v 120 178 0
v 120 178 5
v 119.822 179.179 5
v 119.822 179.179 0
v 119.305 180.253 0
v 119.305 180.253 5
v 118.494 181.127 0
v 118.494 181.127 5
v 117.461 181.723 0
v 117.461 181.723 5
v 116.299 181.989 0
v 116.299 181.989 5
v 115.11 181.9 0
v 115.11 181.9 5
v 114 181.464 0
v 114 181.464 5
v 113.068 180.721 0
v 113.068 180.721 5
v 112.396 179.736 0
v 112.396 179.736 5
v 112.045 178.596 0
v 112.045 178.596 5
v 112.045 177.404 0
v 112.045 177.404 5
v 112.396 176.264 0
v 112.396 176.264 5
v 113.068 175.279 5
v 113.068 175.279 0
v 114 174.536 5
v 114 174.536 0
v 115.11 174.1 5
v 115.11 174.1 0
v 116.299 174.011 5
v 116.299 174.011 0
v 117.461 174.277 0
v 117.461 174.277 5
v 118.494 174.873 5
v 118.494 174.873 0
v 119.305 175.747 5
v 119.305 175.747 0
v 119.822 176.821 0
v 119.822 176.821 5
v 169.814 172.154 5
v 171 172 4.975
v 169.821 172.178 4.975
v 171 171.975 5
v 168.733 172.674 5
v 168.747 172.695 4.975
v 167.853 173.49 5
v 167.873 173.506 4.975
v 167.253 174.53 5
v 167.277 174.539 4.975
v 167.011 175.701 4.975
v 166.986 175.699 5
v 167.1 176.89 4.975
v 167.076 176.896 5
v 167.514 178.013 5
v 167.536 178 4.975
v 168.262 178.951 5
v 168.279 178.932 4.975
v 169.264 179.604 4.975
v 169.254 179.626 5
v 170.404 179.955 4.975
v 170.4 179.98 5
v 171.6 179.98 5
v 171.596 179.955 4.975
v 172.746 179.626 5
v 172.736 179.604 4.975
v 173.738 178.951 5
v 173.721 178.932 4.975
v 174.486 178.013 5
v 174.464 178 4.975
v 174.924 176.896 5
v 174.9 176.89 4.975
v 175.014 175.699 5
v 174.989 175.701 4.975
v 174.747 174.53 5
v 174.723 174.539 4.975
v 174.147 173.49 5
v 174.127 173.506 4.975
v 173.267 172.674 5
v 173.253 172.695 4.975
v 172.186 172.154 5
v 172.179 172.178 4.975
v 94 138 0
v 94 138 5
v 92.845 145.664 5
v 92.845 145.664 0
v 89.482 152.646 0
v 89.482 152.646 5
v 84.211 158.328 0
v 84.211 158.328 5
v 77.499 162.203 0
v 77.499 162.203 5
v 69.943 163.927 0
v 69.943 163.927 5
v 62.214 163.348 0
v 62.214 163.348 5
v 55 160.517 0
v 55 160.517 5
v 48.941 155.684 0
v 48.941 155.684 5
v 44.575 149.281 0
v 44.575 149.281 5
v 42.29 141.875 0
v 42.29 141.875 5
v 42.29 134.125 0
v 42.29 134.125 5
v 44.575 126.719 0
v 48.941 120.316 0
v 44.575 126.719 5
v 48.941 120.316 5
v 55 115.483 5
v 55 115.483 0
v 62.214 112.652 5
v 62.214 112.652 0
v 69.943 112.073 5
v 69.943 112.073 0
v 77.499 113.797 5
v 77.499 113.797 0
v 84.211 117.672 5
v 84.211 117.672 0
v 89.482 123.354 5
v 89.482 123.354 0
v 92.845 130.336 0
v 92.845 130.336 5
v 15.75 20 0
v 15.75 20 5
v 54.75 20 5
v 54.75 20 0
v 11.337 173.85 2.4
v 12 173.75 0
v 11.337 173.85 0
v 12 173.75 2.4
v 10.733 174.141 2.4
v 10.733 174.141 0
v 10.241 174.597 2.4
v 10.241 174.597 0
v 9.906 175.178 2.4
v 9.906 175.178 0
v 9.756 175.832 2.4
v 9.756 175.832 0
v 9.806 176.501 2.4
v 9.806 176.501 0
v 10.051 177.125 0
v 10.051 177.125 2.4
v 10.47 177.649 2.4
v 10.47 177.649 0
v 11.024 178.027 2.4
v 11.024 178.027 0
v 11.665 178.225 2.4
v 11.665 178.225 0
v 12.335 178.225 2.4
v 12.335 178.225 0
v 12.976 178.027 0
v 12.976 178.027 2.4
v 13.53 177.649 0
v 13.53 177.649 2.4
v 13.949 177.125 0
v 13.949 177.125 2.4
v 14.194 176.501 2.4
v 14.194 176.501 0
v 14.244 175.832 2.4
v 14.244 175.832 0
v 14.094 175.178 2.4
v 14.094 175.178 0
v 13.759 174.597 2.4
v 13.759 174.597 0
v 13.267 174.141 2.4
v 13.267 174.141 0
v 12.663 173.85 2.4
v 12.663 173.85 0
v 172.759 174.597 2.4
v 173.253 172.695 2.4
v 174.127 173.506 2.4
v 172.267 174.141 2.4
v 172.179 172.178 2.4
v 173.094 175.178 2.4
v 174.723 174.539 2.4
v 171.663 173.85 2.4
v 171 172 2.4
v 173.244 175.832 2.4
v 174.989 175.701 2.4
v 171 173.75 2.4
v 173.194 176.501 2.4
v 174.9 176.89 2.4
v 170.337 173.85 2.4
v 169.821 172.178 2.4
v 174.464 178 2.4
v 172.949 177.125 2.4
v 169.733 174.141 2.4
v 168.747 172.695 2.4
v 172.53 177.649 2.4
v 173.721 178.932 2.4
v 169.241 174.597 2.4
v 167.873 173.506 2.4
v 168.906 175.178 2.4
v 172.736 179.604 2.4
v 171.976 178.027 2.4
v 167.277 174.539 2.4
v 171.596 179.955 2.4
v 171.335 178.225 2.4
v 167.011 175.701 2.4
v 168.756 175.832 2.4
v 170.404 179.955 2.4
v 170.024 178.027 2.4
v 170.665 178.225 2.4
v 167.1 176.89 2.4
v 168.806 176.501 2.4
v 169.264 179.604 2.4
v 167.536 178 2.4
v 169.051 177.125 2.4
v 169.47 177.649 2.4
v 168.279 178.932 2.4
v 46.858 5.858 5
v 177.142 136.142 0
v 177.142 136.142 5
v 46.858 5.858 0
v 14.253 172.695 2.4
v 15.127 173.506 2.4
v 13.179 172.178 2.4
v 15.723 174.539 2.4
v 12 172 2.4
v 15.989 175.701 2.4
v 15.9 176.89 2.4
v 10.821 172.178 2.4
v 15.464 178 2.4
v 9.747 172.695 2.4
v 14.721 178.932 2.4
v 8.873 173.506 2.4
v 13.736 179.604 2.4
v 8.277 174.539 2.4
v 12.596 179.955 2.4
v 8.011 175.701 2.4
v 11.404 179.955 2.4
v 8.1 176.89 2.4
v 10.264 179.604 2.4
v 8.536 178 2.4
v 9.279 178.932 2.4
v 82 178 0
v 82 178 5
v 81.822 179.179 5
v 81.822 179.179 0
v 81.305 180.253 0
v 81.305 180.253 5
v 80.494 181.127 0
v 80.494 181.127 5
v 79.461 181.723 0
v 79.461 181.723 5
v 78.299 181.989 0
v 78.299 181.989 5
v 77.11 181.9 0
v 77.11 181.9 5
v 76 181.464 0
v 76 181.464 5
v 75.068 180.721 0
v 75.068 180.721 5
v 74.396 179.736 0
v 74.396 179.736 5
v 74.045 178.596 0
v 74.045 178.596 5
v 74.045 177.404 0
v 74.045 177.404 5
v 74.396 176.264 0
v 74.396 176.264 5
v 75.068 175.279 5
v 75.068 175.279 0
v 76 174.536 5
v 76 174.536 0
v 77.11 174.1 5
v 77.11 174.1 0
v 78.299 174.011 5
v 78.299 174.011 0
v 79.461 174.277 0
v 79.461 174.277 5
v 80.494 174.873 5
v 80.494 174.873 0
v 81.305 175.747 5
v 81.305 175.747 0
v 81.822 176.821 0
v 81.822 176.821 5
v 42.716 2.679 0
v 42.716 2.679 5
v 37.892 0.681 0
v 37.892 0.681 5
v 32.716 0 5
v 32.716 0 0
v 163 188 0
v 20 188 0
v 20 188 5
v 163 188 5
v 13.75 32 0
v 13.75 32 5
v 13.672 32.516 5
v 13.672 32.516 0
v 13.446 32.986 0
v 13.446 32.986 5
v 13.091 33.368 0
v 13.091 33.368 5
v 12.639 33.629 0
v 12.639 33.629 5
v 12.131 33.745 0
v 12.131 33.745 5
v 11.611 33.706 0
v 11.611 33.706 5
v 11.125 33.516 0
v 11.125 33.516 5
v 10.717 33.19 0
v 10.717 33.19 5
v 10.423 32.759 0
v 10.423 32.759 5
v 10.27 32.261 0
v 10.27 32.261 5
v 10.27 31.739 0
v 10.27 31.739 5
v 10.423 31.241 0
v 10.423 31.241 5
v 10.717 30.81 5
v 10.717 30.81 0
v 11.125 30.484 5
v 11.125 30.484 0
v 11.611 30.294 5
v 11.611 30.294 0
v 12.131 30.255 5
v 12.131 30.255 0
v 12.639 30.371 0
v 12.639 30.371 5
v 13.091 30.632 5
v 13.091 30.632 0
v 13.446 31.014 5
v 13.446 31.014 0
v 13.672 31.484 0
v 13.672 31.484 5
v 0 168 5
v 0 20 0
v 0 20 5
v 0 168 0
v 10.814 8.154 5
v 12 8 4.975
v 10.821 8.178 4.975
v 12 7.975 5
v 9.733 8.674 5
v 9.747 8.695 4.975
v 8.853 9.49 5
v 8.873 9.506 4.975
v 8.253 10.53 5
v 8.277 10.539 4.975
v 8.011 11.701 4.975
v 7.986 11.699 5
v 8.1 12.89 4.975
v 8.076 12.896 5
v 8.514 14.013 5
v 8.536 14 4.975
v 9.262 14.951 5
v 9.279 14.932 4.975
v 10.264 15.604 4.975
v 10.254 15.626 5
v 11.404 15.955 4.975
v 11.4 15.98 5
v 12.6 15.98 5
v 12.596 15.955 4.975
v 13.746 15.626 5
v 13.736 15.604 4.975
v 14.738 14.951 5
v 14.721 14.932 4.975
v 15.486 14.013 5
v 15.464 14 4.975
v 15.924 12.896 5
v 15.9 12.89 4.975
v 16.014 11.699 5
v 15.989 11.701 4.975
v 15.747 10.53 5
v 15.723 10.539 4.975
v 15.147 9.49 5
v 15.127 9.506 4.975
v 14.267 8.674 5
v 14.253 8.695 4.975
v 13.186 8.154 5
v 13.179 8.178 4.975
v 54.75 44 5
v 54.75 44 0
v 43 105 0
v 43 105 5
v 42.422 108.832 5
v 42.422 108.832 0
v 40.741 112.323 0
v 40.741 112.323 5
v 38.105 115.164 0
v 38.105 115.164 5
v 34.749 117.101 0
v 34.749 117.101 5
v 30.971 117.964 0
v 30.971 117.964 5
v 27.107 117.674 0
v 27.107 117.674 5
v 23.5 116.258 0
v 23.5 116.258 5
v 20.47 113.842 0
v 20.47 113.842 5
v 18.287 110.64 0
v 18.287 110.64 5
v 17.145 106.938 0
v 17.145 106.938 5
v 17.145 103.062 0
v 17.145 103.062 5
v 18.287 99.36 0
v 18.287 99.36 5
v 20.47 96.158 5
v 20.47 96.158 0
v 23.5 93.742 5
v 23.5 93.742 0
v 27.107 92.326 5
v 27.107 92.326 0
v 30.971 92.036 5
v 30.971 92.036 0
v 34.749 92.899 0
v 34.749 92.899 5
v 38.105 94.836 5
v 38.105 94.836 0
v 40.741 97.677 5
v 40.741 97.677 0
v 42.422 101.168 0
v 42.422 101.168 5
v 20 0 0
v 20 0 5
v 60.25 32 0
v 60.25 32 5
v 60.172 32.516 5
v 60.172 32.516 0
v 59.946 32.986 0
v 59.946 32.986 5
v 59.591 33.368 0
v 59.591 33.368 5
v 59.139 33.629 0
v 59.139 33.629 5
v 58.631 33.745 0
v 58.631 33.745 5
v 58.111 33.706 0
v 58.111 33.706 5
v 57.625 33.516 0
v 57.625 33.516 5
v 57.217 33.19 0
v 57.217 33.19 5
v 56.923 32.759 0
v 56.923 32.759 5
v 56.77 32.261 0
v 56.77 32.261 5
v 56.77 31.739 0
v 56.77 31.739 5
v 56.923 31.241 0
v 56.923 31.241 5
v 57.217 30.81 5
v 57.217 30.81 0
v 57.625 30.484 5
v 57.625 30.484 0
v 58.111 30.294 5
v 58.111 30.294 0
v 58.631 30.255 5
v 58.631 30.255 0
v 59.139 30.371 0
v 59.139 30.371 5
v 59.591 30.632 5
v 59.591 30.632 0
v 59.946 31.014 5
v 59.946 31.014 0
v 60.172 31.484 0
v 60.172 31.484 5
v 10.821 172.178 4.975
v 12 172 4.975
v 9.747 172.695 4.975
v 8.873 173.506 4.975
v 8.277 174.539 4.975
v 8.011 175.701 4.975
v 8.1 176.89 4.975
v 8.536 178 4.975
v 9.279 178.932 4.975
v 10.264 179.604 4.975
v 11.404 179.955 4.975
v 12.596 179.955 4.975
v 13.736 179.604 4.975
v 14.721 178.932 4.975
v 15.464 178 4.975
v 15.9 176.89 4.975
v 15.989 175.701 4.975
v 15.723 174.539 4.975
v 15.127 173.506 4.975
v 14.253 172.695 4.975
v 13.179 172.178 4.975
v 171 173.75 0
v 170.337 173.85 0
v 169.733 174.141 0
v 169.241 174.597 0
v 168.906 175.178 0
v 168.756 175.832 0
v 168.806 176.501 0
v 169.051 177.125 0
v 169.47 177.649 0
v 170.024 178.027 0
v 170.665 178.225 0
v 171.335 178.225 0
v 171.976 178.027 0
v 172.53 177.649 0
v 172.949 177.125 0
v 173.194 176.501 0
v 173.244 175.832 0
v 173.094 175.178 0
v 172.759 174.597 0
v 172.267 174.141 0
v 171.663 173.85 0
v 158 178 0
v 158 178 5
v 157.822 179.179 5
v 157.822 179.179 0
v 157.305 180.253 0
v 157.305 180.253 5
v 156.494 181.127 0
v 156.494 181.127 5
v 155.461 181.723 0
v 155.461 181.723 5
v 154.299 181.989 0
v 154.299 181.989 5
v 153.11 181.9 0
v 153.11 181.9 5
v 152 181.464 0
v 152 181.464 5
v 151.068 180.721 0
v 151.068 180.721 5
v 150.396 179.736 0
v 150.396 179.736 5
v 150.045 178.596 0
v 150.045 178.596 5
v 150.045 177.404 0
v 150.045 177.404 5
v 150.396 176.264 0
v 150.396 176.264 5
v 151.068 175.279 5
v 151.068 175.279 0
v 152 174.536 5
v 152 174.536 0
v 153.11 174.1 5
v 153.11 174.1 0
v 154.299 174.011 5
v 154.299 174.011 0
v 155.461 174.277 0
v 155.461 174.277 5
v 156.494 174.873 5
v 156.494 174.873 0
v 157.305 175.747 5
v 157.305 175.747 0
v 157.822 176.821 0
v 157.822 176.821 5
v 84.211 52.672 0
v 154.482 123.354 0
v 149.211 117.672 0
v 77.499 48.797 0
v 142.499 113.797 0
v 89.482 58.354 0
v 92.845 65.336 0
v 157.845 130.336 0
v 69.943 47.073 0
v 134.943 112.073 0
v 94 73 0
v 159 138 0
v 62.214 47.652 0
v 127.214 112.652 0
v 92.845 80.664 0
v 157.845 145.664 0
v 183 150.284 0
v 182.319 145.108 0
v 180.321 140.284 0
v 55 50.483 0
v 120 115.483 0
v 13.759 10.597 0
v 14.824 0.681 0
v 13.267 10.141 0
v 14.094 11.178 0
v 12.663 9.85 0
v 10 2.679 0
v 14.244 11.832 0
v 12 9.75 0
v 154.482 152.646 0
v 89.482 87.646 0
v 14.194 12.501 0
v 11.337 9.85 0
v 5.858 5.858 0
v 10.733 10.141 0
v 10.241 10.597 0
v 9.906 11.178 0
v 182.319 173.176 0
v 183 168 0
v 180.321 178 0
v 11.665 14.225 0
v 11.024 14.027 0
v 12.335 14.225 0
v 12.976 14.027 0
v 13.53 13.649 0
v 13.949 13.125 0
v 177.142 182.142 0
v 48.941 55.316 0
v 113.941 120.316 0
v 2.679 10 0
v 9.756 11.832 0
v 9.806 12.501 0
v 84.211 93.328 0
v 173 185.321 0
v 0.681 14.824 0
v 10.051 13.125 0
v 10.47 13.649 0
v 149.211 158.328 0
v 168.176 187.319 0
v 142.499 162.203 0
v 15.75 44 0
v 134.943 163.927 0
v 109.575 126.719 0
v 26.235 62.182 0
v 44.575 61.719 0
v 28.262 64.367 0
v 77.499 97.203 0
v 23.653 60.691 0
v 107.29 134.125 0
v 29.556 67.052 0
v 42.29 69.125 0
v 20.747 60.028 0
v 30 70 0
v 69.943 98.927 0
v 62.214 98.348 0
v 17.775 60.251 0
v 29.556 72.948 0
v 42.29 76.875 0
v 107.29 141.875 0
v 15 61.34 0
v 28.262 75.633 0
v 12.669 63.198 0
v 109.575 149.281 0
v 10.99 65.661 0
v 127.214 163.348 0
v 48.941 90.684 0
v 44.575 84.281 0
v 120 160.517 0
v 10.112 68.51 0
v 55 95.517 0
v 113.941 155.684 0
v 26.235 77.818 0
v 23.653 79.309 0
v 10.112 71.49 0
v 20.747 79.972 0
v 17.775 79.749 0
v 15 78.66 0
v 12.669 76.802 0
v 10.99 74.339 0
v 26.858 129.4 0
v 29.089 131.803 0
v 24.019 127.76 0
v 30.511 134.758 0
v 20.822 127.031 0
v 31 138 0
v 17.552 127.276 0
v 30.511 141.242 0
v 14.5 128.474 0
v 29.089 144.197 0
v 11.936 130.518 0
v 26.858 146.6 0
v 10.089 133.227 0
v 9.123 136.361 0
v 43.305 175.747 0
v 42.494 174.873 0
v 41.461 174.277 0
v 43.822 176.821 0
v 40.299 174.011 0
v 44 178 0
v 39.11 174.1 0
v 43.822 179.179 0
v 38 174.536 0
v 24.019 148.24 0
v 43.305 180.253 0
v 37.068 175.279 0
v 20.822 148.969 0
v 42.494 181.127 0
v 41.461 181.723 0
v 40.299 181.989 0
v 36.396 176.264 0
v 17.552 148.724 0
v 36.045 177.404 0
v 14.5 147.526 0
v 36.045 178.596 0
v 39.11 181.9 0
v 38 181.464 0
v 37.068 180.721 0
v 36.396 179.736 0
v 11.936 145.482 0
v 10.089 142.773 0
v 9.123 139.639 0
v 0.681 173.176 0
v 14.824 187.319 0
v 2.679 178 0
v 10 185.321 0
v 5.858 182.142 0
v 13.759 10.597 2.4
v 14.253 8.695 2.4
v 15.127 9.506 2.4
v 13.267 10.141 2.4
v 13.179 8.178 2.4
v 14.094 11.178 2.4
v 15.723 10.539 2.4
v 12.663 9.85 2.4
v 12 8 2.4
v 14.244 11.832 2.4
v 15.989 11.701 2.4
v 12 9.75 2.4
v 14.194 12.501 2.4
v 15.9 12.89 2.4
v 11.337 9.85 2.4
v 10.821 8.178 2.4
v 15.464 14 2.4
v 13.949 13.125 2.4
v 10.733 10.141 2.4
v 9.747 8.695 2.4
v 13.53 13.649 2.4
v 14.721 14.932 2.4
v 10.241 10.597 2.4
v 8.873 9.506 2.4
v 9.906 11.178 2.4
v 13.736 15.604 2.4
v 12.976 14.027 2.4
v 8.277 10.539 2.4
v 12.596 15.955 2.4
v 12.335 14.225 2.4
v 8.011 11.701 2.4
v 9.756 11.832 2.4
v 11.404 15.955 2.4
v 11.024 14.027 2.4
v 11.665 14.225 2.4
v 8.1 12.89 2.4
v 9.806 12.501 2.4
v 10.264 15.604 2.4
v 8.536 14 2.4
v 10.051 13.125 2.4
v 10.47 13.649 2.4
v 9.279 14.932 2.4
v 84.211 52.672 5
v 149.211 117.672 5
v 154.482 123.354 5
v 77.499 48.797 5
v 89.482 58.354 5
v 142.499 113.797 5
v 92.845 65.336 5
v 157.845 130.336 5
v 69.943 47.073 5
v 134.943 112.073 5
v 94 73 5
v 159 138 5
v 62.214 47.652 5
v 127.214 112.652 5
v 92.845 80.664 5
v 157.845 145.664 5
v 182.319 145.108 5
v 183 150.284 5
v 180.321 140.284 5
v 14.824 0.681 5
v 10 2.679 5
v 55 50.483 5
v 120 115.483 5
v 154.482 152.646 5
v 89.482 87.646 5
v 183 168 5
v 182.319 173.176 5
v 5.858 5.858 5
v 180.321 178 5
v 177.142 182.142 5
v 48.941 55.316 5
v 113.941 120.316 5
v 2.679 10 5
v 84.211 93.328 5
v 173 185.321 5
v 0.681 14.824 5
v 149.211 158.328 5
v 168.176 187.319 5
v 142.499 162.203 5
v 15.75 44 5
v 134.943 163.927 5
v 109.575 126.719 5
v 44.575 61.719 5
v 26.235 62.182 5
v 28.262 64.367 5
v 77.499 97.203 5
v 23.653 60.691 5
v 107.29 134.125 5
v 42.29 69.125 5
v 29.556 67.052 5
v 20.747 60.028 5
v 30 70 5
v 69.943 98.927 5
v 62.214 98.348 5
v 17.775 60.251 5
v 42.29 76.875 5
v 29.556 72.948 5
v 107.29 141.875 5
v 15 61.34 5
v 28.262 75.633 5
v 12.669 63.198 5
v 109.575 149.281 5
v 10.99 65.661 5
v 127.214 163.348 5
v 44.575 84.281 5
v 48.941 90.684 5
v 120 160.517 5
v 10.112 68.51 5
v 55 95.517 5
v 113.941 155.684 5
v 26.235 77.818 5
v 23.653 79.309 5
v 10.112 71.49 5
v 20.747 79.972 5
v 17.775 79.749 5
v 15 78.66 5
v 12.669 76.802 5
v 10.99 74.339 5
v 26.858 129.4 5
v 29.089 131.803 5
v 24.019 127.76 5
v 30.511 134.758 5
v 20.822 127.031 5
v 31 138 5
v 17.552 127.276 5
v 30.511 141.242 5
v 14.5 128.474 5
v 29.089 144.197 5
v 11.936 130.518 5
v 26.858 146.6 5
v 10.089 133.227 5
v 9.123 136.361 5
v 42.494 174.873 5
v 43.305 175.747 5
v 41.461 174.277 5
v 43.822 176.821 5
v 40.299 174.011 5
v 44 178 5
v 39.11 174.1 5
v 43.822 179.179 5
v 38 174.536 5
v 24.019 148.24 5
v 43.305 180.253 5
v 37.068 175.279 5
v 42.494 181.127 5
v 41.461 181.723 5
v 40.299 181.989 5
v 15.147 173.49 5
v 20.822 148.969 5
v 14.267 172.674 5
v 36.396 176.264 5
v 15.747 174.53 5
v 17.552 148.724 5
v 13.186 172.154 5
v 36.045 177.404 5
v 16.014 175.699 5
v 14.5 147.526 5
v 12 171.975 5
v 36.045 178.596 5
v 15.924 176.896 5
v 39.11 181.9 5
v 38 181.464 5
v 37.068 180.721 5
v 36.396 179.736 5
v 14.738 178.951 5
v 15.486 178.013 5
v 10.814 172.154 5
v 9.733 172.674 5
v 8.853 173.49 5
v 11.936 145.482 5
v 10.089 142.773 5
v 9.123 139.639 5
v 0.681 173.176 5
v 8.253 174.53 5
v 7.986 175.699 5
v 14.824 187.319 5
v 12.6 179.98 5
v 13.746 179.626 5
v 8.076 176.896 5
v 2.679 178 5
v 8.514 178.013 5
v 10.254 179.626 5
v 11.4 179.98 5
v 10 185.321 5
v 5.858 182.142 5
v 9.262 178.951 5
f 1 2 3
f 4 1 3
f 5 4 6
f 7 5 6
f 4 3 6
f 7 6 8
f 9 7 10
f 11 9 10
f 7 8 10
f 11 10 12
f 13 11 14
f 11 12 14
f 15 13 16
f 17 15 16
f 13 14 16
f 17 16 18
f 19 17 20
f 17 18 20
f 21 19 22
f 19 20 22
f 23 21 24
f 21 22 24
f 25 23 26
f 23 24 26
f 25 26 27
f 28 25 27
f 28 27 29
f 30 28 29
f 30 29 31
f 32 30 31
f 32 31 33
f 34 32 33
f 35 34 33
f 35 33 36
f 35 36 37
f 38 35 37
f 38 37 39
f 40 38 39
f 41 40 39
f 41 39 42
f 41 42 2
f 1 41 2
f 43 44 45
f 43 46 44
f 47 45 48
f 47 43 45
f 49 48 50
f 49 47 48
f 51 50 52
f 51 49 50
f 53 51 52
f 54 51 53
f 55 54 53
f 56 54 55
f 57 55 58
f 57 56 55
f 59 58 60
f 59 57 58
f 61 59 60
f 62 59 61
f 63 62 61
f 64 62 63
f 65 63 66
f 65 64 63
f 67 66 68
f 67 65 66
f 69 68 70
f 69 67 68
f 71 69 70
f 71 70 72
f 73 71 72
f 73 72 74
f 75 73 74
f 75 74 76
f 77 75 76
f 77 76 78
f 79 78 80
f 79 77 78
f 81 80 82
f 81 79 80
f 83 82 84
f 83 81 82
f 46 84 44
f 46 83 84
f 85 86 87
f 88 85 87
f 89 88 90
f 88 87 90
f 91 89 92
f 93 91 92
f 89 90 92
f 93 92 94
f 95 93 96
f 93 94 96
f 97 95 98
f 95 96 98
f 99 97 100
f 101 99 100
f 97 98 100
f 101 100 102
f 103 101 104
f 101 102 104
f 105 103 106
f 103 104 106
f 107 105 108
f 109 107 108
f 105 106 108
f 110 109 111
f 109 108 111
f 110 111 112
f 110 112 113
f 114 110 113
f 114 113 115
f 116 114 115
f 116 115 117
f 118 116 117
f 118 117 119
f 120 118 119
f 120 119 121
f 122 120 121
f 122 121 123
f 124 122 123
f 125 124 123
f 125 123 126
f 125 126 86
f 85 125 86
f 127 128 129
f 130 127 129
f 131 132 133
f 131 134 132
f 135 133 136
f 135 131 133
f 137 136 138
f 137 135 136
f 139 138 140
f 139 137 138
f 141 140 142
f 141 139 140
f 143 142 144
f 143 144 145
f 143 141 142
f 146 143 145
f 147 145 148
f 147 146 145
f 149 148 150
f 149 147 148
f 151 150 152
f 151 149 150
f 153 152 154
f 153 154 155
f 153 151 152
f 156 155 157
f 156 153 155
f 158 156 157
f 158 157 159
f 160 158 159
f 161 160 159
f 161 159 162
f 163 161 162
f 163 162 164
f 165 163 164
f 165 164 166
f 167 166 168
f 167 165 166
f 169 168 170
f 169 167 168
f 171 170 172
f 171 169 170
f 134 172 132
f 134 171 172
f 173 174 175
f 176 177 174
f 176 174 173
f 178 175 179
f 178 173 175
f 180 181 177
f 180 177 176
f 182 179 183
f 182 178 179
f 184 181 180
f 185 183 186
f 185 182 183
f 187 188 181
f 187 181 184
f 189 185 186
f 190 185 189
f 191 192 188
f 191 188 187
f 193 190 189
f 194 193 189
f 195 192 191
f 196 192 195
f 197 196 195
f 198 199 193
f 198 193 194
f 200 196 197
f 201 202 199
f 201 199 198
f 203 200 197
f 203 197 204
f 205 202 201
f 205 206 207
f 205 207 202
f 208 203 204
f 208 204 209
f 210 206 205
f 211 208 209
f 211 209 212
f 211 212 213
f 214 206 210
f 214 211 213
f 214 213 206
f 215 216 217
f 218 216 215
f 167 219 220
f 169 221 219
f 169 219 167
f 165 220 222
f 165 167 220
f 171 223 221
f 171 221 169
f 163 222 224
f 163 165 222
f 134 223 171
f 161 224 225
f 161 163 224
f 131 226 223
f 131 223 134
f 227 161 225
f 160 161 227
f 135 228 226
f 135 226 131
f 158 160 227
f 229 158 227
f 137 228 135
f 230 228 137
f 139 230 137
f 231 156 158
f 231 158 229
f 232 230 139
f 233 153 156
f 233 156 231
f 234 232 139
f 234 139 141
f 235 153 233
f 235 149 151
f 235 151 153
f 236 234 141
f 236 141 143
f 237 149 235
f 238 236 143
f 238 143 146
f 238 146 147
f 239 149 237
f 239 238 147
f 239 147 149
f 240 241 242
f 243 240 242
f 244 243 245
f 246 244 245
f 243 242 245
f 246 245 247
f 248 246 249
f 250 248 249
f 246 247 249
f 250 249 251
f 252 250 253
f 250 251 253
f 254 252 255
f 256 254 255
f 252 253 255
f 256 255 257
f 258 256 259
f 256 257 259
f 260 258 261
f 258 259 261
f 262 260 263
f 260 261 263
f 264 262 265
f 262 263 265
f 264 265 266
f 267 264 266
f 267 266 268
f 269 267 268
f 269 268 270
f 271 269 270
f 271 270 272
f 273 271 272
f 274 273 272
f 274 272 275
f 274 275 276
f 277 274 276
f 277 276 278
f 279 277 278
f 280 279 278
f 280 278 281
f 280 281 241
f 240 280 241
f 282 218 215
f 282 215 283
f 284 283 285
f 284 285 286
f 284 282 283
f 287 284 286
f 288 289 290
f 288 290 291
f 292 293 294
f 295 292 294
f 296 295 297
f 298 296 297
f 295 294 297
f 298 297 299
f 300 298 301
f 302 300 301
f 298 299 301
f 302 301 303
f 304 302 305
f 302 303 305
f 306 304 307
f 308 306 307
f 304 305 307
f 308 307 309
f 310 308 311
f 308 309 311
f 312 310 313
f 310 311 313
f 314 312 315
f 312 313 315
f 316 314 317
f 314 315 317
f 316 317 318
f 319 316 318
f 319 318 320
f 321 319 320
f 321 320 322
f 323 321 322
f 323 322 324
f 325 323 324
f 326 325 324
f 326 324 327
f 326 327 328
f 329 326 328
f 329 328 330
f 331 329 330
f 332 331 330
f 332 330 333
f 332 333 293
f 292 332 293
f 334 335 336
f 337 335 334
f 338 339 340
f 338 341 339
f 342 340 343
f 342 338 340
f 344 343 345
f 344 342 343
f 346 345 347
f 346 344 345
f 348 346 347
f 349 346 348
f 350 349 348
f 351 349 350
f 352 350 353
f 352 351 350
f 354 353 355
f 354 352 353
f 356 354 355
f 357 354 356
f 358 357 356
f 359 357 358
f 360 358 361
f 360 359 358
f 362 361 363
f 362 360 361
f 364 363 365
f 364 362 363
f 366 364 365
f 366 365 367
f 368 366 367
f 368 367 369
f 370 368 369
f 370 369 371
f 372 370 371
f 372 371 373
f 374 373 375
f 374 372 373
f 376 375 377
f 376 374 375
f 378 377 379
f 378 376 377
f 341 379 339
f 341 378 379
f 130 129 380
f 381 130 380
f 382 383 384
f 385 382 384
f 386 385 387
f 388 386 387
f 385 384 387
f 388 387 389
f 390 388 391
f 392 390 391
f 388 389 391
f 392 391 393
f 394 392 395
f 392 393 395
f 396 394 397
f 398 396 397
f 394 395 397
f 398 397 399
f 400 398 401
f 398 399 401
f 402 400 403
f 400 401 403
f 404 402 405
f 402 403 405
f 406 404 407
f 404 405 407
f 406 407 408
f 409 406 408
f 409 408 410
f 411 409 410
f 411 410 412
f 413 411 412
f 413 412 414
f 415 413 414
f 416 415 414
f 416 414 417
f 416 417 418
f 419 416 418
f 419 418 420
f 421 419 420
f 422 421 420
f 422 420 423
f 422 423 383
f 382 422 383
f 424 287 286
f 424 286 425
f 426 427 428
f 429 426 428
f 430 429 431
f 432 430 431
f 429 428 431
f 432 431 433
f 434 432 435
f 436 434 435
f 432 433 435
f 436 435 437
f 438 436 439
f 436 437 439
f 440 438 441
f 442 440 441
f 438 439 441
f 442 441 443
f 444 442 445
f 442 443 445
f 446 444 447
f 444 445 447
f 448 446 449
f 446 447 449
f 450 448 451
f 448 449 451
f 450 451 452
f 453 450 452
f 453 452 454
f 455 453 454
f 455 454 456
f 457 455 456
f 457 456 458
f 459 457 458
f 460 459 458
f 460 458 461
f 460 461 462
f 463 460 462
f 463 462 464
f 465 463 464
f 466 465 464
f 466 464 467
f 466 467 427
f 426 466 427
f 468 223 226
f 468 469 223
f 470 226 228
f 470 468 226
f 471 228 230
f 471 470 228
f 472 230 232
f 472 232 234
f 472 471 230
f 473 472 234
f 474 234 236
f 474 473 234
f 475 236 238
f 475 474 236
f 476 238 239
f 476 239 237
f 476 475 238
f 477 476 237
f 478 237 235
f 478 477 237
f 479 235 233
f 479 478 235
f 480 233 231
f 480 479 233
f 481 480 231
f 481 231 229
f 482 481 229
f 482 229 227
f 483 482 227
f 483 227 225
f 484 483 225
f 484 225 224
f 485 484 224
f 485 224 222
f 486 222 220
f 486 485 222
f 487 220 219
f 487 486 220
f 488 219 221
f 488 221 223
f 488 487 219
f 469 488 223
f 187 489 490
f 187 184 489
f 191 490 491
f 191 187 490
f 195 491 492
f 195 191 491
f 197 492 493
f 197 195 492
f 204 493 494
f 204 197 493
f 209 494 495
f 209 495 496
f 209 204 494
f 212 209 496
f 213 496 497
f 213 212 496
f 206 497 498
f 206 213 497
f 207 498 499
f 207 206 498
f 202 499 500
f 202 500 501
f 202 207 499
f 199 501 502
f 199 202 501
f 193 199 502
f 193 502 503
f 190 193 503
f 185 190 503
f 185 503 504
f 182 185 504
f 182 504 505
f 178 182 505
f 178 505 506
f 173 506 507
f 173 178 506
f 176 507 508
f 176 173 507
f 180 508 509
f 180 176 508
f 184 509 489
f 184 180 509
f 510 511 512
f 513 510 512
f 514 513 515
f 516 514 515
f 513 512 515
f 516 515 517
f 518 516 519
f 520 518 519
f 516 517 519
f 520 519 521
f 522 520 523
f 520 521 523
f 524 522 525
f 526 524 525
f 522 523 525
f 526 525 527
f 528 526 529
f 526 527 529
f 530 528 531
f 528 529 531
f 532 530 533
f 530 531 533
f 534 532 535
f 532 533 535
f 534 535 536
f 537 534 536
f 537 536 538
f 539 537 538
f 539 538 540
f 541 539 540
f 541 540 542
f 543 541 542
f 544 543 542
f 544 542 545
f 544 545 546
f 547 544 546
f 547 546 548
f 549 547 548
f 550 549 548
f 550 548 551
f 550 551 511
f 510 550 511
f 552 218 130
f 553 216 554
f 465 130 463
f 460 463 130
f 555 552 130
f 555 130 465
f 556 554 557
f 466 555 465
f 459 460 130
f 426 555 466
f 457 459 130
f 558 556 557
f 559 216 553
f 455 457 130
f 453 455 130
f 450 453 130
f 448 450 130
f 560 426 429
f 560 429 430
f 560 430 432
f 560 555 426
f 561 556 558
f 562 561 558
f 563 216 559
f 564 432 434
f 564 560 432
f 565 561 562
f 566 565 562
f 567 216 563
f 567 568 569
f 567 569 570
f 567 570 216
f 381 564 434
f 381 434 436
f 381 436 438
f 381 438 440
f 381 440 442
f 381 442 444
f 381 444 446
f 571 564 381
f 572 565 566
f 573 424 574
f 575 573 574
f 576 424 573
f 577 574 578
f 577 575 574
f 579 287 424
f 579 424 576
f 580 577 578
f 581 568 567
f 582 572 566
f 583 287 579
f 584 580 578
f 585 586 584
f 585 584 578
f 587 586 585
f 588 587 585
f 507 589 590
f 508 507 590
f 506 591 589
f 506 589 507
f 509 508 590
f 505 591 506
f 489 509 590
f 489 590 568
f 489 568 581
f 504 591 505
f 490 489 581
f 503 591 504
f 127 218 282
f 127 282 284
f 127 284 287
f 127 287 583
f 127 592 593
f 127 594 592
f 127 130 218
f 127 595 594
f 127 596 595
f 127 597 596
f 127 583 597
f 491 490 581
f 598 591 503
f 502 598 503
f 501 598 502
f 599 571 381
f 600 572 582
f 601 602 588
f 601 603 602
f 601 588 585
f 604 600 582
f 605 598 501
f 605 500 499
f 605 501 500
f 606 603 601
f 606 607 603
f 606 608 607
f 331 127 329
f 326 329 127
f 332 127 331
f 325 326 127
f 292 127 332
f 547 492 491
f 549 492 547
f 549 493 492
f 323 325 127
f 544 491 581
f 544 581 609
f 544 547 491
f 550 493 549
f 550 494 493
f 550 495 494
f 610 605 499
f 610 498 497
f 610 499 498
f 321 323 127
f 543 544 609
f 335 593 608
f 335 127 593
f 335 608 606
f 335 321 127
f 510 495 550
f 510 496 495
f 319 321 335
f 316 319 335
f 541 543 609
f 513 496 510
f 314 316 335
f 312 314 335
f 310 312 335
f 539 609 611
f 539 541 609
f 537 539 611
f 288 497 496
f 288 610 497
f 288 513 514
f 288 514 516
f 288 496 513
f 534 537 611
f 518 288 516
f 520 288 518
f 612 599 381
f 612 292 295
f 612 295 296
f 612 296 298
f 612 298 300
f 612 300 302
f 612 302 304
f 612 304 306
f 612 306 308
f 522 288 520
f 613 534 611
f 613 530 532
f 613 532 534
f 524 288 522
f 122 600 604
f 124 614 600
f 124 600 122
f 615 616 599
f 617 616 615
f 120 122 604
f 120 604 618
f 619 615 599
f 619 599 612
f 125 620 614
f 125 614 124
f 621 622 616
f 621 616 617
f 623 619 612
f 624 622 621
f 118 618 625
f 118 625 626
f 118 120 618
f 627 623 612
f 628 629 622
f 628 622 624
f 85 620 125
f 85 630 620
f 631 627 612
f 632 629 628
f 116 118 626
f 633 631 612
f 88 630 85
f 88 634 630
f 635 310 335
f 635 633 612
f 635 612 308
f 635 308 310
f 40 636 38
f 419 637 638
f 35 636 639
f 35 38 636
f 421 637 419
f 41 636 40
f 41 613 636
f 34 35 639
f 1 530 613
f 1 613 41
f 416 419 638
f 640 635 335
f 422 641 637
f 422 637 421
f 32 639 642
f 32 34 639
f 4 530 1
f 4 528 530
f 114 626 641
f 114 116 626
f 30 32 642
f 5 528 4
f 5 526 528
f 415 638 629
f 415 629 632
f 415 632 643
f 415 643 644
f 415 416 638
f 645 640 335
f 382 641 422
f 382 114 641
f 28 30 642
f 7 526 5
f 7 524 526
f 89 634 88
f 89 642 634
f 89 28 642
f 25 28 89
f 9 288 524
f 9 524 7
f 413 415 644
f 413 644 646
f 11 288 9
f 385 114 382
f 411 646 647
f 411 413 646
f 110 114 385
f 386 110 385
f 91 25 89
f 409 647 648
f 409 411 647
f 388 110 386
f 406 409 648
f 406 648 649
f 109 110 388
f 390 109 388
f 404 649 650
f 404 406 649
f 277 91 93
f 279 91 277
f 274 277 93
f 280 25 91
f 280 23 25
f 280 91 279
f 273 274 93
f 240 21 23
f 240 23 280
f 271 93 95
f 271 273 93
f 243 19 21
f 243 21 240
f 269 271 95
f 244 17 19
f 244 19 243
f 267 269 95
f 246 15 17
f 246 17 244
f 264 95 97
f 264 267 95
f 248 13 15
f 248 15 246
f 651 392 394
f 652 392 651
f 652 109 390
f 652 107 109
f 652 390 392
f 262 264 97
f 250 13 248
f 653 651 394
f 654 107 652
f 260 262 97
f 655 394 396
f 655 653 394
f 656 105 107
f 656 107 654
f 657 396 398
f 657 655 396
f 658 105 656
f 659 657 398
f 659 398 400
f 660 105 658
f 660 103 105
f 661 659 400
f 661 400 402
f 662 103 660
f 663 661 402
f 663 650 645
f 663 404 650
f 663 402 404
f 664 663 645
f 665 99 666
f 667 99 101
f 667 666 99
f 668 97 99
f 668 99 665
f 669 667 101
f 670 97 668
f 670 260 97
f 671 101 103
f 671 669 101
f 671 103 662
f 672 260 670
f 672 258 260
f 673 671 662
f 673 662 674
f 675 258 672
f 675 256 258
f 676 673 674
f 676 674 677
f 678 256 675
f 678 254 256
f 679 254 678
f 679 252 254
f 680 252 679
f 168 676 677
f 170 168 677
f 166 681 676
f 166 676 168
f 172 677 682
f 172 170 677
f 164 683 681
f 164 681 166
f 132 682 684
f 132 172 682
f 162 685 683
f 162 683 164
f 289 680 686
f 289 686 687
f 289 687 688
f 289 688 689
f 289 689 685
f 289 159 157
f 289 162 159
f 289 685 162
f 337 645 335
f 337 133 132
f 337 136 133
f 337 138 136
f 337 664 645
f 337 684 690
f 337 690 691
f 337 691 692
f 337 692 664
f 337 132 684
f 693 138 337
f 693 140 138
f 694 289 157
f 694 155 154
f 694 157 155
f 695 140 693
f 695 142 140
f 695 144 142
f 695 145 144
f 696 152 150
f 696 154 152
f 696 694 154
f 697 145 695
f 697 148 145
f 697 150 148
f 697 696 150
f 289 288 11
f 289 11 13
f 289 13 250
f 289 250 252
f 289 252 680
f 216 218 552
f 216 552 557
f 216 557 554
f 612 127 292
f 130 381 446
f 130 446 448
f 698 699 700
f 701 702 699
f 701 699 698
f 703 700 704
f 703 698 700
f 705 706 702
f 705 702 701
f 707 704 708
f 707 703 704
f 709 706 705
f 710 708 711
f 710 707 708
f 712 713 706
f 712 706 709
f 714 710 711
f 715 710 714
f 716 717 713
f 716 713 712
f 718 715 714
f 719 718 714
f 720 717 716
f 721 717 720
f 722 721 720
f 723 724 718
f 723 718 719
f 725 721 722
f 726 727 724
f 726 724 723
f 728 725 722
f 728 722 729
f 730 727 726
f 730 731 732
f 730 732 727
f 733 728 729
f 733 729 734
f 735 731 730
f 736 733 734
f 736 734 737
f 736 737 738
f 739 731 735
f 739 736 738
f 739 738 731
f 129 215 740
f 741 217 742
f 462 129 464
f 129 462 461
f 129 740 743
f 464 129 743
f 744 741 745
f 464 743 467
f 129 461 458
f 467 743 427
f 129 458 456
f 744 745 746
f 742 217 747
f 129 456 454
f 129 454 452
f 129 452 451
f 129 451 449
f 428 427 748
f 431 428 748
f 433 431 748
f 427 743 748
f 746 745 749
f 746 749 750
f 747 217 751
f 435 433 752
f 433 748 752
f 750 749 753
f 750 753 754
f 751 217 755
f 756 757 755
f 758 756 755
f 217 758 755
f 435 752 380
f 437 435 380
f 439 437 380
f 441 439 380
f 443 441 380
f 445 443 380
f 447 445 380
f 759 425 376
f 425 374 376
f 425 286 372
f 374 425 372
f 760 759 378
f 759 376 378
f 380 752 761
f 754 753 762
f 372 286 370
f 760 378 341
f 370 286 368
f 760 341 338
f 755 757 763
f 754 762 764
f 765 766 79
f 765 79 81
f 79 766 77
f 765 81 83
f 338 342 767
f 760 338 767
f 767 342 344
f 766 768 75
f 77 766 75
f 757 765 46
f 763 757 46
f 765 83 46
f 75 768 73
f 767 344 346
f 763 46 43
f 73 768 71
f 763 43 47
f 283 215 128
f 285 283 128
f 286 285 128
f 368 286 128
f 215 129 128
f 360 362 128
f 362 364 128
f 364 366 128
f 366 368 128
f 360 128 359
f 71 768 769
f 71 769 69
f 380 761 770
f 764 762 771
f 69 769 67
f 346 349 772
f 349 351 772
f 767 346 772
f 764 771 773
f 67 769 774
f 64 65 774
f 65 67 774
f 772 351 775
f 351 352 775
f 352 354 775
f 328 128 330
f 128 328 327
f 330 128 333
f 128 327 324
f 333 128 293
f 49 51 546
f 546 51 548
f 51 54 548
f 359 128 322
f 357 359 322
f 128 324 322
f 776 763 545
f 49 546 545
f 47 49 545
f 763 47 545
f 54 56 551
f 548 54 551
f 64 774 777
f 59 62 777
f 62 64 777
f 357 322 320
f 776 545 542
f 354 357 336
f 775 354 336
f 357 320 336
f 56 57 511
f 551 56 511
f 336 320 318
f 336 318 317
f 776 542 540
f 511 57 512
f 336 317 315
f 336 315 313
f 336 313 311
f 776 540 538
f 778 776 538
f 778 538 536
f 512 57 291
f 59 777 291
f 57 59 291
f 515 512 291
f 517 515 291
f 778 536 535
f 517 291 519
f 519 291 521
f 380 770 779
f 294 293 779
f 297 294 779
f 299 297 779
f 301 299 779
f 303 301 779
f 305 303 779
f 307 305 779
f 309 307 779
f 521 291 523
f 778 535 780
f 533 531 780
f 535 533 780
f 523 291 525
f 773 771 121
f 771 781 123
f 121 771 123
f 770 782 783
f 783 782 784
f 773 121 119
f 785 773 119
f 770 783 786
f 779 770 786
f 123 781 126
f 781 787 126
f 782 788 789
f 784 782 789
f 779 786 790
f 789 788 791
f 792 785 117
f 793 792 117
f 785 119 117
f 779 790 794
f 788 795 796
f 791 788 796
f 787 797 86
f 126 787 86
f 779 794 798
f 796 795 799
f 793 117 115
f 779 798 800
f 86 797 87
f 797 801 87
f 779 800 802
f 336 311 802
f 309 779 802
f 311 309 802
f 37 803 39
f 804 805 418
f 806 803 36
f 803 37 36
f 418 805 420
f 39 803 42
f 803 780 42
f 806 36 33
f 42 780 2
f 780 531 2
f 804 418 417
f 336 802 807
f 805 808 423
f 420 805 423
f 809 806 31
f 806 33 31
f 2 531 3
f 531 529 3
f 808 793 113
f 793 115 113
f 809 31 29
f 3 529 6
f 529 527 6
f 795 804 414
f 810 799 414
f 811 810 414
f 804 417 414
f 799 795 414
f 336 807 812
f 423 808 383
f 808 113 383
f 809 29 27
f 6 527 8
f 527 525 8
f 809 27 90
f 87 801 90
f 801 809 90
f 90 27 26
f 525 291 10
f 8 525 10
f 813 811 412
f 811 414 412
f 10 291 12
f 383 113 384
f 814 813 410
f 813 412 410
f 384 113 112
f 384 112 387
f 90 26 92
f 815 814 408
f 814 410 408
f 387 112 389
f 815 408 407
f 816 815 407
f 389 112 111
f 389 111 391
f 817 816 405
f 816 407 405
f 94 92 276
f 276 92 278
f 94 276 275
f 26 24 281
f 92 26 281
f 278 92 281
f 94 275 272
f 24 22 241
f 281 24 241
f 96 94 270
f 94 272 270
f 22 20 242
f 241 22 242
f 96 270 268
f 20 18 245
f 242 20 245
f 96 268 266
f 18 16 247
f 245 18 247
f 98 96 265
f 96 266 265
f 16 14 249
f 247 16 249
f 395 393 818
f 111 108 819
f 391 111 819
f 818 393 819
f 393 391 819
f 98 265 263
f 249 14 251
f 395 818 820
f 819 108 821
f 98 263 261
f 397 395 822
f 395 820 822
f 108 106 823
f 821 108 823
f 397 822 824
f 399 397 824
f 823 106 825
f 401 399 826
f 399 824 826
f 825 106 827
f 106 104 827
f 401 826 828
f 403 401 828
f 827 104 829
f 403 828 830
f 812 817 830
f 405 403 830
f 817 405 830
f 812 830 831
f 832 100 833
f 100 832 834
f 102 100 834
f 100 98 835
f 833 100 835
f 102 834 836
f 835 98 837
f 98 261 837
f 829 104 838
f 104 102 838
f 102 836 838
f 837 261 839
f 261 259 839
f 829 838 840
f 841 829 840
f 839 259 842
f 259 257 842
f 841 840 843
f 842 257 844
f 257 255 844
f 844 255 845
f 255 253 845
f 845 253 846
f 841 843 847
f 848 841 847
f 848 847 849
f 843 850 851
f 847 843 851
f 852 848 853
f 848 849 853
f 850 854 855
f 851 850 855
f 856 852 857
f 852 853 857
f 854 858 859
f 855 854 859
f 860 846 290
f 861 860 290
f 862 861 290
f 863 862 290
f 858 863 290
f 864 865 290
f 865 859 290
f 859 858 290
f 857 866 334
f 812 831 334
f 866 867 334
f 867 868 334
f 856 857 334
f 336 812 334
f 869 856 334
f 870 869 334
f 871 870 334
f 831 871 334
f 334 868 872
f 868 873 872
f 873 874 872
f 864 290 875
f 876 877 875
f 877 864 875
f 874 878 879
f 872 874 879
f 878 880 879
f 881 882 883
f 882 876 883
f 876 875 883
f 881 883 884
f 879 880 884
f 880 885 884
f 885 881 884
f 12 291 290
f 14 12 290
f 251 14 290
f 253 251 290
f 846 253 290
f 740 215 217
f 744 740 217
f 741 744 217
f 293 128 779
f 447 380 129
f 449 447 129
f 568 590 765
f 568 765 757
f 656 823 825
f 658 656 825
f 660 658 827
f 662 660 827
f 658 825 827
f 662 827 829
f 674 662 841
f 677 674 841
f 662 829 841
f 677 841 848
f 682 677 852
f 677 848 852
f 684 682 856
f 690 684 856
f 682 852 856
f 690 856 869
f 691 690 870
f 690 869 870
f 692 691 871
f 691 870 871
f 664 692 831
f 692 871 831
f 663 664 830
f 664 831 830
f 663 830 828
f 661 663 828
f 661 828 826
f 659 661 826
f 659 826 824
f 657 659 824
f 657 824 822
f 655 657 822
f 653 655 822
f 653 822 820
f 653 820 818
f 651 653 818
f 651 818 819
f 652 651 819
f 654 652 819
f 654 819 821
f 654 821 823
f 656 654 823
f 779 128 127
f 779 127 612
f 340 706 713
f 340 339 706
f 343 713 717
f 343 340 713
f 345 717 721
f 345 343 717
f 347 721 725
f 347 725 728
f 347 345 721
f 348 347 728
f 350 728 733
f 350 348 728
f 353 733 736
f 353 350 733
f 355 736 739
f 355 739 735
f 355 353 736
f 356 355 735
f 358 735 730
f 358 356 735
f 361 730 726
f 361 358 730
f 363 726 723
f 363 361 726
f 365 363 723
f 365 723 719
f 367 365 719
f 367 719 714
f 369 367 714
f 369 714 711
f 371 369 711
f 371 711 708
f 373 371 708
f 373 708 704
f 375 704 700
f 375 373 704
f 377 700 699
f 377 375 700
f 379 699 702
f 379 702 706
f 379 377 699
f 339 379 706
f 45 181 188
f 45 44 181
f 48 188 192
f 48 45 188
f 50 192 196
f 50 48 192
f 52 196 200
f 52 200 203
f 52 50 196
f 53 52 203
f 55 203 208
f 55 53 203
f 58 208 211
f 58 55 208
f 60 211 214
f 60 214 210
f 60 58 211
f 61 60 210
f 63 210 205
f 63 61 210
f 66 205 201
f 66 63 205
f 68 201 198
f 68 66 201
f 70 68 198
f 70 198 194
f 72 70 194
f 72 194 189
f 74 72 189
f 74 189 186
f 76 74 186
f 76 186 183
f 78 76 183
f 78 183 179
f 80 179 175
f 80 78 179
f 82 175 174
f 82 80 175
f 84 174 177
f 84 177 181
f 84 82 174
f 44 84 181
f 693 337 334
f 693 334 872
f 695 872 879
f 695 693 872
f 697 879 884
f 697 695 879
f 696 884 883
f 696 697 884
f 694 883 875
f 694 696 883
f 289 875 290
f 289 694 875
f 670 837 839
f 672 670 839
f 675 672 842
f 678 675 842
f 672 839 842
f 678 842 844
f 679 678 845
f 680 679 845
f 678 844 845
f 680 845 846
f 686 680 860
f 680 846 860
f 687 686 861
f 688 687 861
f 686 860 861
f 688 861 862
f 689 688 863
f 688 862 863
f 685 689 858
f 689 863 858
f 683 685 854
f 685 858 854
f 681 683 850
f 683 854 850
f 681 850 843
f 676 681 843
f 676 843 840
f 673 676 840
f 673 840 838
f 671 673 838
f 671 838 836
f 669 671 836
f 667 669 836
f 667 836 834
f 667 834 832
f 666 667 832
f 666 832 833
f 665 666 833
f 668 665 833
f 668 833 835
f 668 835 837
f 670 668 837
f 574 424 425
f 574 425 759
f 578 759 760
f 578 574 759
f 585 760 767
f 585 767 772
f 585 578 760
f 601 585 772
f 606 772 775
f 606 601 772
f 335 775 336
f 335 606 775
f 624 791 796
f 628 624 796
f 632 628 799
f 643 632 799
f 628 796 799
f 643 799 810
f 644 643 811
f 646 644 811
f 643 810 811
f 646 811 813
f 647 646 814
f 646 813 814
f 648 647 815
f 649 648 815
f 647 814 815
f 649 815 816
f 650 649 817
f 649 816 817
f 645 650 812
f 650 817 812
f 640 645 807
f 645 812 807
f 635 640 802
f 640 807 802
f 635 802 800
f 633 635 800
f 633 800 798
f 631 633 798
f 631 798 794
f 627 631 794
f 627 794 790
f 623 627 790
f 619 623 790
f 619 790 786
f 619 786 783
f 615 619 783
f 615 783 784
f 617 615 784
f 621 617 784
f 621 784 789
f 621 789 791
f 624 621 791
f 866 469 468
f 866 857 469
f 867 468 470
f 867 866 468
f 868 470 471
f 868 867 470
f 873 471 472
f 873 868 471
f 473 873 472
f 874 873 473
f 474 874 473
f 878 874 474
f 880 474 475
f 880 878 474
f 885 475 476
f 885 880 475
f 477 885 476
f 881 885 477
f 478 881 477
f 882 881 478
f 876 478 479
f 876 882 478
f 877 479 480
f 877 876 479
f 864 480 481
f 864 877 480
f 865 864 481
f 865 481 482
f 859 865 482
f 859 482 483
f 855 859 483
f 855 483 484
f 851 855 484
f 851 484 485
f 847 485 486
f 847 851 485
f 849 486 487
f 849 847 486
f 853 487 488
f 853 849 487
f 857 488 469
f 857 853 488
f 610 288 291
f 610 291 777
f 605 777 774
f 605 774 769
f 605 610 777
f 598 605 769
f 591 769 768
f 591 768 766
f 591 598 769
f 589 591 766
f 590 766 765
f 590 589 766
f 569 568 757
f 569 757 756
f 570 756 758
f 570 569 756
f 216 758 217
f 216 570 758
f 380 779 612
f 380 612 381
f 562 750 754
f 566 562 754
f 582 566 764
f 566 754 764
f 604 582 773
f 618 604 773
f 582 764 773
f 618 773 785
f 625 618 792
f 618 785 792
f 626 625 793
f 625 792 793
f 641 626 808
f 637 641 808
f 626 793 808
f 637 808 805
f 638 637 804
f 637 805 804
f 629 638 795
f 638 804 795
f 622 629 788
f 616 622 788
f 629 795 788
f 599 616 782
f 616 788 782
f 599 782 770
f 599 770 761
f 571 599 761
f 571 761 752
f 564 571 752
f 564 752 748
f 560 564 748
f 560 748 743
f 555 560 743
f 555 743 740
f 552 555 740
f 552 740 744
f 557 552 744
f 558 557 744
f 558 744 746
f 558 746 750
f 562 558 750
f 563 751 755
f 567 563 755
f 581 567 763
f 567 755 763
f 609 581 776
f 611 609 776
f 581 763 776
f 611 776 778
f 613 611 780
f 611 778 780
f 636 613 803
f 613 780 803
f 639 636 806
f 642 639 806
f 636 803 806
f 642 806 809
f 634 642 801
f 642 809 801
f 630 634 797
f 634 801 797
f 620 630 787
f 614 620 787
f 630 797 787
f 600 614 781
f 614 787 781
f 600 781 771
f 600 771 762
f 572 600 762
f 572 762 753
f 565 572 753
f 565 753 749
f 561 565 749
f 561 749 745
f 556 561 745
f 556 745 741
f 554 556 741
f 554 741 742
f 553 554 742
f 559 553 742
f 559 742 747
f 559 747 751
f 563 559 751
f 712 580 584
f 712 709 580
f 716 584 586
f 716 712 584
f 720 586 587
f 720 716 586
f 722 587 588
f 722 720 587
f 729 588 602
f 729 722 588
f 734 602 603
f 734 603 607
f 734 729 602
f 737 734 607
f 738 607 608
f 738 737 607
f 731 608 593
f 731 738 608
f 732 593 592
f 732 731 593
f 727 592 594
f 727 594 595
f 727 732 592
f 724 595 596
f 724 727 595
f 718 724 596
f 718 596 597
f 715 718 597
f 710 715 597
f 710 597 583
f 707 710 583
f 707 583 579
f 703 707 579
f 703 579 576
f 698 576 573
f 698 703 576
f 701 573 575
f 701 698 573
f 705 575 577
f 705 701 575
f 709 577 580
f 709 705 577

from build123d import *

# Parameters (mm, degrees)
ESTRUSIONE_ESTRUSIONE1_DEPTH                 = 5
FORO_LAMATO_PER_VITE_M4_A_TESTA_CILI_2_COUNT = 2
FORO_LAMATO_PER_VITE_M4_A_TESTA_CILI_2_PITCH = 164
FORO_LAMATO_PER_VITE_M4_A_TESTA_CILI_3_COUNT = 2
FORO_LAMATO_PER_VITE_M4_A_TESTA_CILI_3_PITCH = 159
SCHIZZO5_R                                   = 1.75
SCHIZZO5_R_2                                 = 10
SCHIZZO5_R_3                                 = 11
SCHIZZO5_R_4                                 = 13
SCHIZZO5_R_5                                 = 4
SCHIZZO5_R_6                                 = 26
SCHIZZO5_W                                   = 39
SCHIZZO5_H                                   = 24
TAGLIO_ESTRUSIONE2_DEPTH                     = 7


with BuildPart() as part:
    # Schizzo1 → Estrusione-Estrusione1 (new body)
    with BuildSketch(Plane.XY):
        with BuildLine():
            Line((0, 20), (0, 168))
            ThreePointArc((0, 168), (5.857864376, 182.142135624), (20, 188))
            Line((20, 188), (163, 188))
            ThreePointArc((163, 188), (177.142135624, 182.142135624), (183, 168))
            Line((183, 168), (183, 150.284271247))
            ThreePointArc((183, 150.284271247), (181.47759065, 142.6306026), (177.142135624, 136.142135624))
            Line((177.142135624, 136.142135624), (46.857864376, 5.857864376))
            ThreePointArc((46.857864376, 5.857864376), (40.3693974, 1.52240935), (32.715728753, 0))
            Line((32.715728753, 0), (20, 0))
            ThreePointArc((20, 0), (5.857864376, 5.857864376), (0, 20))
        make_face()
    extrude(amount=ESTRUSIONE_ESTRUSIONE1_DEPTH)

    # Schizzo4 → Foro lamato per Vite M4 a testa cilindrica piana-1 (revolve, cut)
    with BuildSketch(Plane(origin=(12, 176, 5), x_dir=(0, -1, 0), z_dir=(1, 0, 0))):
        Polygon((0, 0), (0, 5), (2.25, 5), (2.25, 2.6), (4, 2.6), (4, 0.025), (4.025, 0), align=None)
    foro_lamato_per_vite_m4_a_testa_cilindri = revolve(axis=Axis((12, 176, 11.35), (0, 0, -1)), mode=Mode.SUBTRACT)

    # Foro lamato per Vite M4 a testa cili 2: Foro lamato per Vite M4 a testa cilindrica piana-1 ×2
    with Locations(*[(0, -i * FORO_LAMATO_PER_VITE_M4_A_TESTA_CILI_2_PITCH, 0) for i in range(1, FORO_LAMATO_PER_VITE_M4_A_TESTA_CILI_2_COUNT)]):
        add(foro_lamato_per_vite_m4_a_testa_cilindri, mode=Mode.SUBTRACT)

    # Foro lamato per Vite M4 a testa cili 3: Foro lamato per Vite M4 a testa cilindrica piana-1 ×2
    with Locations(*[(i * FORO_LAMATO_PER_VITE_M4_A_TESTA_CILI_3_PITCH, 0, 0) for i in range(1, FORO_LAMATO_PER_VITE_M4_A_TESTA_CILI_3_COUNT)]):
        add(foro_lamato_per_vite_m4_a_testa_cilindri, mode=Mode.SUBTRACT)

    # Schizzo5 → Taglio-Estrusione2 (cut)
    with BuildSketch(Plane.XY.offset(5)):
        with Locations((12, 32)):
            Circle(SCHIZZO5_R)
        with Locations((58.5, 32)):
            Circle(SCHIZZO5_R)
        with Locations((20, 70)):
            Circle(SCHIZZO5_R_2)
        with Locations((20, 138)):
            Circle(SCHIZZO5_R_3)
        with Locations((30, 105)):
            Circle(SCHIZZO5_R_4)
        with Locations((40, 178)):
            Circle(SCHIZZO5_R_5)
        with Locations((78, 178)):
            Circle(SCHIZZO5_R_5)
        with Locations((116, 178)):
            Circle(SCHIZZO5_R_5)
        with Locations((154, 178)):
            Circle(SCHIZZO5_R_5)
        with Locations((68, 138)):
            Circle(SCHIZZO5_R_6)
        with Locations((133, 138)):
            Circle(SCHIZZO5_R_6)
        with Locations((68, 73)):
            Circle(SCHIZZO5_R_6)
        with Locations((35.25, 32)):
            Rectangle(SCHIZZO5_W, SCHIZZO5_H)
    extrude(amount=-TAGLIO_ESTRUSIONE2_DEPTH, mode=Mode.SUBTRACT)


solid = part.part
